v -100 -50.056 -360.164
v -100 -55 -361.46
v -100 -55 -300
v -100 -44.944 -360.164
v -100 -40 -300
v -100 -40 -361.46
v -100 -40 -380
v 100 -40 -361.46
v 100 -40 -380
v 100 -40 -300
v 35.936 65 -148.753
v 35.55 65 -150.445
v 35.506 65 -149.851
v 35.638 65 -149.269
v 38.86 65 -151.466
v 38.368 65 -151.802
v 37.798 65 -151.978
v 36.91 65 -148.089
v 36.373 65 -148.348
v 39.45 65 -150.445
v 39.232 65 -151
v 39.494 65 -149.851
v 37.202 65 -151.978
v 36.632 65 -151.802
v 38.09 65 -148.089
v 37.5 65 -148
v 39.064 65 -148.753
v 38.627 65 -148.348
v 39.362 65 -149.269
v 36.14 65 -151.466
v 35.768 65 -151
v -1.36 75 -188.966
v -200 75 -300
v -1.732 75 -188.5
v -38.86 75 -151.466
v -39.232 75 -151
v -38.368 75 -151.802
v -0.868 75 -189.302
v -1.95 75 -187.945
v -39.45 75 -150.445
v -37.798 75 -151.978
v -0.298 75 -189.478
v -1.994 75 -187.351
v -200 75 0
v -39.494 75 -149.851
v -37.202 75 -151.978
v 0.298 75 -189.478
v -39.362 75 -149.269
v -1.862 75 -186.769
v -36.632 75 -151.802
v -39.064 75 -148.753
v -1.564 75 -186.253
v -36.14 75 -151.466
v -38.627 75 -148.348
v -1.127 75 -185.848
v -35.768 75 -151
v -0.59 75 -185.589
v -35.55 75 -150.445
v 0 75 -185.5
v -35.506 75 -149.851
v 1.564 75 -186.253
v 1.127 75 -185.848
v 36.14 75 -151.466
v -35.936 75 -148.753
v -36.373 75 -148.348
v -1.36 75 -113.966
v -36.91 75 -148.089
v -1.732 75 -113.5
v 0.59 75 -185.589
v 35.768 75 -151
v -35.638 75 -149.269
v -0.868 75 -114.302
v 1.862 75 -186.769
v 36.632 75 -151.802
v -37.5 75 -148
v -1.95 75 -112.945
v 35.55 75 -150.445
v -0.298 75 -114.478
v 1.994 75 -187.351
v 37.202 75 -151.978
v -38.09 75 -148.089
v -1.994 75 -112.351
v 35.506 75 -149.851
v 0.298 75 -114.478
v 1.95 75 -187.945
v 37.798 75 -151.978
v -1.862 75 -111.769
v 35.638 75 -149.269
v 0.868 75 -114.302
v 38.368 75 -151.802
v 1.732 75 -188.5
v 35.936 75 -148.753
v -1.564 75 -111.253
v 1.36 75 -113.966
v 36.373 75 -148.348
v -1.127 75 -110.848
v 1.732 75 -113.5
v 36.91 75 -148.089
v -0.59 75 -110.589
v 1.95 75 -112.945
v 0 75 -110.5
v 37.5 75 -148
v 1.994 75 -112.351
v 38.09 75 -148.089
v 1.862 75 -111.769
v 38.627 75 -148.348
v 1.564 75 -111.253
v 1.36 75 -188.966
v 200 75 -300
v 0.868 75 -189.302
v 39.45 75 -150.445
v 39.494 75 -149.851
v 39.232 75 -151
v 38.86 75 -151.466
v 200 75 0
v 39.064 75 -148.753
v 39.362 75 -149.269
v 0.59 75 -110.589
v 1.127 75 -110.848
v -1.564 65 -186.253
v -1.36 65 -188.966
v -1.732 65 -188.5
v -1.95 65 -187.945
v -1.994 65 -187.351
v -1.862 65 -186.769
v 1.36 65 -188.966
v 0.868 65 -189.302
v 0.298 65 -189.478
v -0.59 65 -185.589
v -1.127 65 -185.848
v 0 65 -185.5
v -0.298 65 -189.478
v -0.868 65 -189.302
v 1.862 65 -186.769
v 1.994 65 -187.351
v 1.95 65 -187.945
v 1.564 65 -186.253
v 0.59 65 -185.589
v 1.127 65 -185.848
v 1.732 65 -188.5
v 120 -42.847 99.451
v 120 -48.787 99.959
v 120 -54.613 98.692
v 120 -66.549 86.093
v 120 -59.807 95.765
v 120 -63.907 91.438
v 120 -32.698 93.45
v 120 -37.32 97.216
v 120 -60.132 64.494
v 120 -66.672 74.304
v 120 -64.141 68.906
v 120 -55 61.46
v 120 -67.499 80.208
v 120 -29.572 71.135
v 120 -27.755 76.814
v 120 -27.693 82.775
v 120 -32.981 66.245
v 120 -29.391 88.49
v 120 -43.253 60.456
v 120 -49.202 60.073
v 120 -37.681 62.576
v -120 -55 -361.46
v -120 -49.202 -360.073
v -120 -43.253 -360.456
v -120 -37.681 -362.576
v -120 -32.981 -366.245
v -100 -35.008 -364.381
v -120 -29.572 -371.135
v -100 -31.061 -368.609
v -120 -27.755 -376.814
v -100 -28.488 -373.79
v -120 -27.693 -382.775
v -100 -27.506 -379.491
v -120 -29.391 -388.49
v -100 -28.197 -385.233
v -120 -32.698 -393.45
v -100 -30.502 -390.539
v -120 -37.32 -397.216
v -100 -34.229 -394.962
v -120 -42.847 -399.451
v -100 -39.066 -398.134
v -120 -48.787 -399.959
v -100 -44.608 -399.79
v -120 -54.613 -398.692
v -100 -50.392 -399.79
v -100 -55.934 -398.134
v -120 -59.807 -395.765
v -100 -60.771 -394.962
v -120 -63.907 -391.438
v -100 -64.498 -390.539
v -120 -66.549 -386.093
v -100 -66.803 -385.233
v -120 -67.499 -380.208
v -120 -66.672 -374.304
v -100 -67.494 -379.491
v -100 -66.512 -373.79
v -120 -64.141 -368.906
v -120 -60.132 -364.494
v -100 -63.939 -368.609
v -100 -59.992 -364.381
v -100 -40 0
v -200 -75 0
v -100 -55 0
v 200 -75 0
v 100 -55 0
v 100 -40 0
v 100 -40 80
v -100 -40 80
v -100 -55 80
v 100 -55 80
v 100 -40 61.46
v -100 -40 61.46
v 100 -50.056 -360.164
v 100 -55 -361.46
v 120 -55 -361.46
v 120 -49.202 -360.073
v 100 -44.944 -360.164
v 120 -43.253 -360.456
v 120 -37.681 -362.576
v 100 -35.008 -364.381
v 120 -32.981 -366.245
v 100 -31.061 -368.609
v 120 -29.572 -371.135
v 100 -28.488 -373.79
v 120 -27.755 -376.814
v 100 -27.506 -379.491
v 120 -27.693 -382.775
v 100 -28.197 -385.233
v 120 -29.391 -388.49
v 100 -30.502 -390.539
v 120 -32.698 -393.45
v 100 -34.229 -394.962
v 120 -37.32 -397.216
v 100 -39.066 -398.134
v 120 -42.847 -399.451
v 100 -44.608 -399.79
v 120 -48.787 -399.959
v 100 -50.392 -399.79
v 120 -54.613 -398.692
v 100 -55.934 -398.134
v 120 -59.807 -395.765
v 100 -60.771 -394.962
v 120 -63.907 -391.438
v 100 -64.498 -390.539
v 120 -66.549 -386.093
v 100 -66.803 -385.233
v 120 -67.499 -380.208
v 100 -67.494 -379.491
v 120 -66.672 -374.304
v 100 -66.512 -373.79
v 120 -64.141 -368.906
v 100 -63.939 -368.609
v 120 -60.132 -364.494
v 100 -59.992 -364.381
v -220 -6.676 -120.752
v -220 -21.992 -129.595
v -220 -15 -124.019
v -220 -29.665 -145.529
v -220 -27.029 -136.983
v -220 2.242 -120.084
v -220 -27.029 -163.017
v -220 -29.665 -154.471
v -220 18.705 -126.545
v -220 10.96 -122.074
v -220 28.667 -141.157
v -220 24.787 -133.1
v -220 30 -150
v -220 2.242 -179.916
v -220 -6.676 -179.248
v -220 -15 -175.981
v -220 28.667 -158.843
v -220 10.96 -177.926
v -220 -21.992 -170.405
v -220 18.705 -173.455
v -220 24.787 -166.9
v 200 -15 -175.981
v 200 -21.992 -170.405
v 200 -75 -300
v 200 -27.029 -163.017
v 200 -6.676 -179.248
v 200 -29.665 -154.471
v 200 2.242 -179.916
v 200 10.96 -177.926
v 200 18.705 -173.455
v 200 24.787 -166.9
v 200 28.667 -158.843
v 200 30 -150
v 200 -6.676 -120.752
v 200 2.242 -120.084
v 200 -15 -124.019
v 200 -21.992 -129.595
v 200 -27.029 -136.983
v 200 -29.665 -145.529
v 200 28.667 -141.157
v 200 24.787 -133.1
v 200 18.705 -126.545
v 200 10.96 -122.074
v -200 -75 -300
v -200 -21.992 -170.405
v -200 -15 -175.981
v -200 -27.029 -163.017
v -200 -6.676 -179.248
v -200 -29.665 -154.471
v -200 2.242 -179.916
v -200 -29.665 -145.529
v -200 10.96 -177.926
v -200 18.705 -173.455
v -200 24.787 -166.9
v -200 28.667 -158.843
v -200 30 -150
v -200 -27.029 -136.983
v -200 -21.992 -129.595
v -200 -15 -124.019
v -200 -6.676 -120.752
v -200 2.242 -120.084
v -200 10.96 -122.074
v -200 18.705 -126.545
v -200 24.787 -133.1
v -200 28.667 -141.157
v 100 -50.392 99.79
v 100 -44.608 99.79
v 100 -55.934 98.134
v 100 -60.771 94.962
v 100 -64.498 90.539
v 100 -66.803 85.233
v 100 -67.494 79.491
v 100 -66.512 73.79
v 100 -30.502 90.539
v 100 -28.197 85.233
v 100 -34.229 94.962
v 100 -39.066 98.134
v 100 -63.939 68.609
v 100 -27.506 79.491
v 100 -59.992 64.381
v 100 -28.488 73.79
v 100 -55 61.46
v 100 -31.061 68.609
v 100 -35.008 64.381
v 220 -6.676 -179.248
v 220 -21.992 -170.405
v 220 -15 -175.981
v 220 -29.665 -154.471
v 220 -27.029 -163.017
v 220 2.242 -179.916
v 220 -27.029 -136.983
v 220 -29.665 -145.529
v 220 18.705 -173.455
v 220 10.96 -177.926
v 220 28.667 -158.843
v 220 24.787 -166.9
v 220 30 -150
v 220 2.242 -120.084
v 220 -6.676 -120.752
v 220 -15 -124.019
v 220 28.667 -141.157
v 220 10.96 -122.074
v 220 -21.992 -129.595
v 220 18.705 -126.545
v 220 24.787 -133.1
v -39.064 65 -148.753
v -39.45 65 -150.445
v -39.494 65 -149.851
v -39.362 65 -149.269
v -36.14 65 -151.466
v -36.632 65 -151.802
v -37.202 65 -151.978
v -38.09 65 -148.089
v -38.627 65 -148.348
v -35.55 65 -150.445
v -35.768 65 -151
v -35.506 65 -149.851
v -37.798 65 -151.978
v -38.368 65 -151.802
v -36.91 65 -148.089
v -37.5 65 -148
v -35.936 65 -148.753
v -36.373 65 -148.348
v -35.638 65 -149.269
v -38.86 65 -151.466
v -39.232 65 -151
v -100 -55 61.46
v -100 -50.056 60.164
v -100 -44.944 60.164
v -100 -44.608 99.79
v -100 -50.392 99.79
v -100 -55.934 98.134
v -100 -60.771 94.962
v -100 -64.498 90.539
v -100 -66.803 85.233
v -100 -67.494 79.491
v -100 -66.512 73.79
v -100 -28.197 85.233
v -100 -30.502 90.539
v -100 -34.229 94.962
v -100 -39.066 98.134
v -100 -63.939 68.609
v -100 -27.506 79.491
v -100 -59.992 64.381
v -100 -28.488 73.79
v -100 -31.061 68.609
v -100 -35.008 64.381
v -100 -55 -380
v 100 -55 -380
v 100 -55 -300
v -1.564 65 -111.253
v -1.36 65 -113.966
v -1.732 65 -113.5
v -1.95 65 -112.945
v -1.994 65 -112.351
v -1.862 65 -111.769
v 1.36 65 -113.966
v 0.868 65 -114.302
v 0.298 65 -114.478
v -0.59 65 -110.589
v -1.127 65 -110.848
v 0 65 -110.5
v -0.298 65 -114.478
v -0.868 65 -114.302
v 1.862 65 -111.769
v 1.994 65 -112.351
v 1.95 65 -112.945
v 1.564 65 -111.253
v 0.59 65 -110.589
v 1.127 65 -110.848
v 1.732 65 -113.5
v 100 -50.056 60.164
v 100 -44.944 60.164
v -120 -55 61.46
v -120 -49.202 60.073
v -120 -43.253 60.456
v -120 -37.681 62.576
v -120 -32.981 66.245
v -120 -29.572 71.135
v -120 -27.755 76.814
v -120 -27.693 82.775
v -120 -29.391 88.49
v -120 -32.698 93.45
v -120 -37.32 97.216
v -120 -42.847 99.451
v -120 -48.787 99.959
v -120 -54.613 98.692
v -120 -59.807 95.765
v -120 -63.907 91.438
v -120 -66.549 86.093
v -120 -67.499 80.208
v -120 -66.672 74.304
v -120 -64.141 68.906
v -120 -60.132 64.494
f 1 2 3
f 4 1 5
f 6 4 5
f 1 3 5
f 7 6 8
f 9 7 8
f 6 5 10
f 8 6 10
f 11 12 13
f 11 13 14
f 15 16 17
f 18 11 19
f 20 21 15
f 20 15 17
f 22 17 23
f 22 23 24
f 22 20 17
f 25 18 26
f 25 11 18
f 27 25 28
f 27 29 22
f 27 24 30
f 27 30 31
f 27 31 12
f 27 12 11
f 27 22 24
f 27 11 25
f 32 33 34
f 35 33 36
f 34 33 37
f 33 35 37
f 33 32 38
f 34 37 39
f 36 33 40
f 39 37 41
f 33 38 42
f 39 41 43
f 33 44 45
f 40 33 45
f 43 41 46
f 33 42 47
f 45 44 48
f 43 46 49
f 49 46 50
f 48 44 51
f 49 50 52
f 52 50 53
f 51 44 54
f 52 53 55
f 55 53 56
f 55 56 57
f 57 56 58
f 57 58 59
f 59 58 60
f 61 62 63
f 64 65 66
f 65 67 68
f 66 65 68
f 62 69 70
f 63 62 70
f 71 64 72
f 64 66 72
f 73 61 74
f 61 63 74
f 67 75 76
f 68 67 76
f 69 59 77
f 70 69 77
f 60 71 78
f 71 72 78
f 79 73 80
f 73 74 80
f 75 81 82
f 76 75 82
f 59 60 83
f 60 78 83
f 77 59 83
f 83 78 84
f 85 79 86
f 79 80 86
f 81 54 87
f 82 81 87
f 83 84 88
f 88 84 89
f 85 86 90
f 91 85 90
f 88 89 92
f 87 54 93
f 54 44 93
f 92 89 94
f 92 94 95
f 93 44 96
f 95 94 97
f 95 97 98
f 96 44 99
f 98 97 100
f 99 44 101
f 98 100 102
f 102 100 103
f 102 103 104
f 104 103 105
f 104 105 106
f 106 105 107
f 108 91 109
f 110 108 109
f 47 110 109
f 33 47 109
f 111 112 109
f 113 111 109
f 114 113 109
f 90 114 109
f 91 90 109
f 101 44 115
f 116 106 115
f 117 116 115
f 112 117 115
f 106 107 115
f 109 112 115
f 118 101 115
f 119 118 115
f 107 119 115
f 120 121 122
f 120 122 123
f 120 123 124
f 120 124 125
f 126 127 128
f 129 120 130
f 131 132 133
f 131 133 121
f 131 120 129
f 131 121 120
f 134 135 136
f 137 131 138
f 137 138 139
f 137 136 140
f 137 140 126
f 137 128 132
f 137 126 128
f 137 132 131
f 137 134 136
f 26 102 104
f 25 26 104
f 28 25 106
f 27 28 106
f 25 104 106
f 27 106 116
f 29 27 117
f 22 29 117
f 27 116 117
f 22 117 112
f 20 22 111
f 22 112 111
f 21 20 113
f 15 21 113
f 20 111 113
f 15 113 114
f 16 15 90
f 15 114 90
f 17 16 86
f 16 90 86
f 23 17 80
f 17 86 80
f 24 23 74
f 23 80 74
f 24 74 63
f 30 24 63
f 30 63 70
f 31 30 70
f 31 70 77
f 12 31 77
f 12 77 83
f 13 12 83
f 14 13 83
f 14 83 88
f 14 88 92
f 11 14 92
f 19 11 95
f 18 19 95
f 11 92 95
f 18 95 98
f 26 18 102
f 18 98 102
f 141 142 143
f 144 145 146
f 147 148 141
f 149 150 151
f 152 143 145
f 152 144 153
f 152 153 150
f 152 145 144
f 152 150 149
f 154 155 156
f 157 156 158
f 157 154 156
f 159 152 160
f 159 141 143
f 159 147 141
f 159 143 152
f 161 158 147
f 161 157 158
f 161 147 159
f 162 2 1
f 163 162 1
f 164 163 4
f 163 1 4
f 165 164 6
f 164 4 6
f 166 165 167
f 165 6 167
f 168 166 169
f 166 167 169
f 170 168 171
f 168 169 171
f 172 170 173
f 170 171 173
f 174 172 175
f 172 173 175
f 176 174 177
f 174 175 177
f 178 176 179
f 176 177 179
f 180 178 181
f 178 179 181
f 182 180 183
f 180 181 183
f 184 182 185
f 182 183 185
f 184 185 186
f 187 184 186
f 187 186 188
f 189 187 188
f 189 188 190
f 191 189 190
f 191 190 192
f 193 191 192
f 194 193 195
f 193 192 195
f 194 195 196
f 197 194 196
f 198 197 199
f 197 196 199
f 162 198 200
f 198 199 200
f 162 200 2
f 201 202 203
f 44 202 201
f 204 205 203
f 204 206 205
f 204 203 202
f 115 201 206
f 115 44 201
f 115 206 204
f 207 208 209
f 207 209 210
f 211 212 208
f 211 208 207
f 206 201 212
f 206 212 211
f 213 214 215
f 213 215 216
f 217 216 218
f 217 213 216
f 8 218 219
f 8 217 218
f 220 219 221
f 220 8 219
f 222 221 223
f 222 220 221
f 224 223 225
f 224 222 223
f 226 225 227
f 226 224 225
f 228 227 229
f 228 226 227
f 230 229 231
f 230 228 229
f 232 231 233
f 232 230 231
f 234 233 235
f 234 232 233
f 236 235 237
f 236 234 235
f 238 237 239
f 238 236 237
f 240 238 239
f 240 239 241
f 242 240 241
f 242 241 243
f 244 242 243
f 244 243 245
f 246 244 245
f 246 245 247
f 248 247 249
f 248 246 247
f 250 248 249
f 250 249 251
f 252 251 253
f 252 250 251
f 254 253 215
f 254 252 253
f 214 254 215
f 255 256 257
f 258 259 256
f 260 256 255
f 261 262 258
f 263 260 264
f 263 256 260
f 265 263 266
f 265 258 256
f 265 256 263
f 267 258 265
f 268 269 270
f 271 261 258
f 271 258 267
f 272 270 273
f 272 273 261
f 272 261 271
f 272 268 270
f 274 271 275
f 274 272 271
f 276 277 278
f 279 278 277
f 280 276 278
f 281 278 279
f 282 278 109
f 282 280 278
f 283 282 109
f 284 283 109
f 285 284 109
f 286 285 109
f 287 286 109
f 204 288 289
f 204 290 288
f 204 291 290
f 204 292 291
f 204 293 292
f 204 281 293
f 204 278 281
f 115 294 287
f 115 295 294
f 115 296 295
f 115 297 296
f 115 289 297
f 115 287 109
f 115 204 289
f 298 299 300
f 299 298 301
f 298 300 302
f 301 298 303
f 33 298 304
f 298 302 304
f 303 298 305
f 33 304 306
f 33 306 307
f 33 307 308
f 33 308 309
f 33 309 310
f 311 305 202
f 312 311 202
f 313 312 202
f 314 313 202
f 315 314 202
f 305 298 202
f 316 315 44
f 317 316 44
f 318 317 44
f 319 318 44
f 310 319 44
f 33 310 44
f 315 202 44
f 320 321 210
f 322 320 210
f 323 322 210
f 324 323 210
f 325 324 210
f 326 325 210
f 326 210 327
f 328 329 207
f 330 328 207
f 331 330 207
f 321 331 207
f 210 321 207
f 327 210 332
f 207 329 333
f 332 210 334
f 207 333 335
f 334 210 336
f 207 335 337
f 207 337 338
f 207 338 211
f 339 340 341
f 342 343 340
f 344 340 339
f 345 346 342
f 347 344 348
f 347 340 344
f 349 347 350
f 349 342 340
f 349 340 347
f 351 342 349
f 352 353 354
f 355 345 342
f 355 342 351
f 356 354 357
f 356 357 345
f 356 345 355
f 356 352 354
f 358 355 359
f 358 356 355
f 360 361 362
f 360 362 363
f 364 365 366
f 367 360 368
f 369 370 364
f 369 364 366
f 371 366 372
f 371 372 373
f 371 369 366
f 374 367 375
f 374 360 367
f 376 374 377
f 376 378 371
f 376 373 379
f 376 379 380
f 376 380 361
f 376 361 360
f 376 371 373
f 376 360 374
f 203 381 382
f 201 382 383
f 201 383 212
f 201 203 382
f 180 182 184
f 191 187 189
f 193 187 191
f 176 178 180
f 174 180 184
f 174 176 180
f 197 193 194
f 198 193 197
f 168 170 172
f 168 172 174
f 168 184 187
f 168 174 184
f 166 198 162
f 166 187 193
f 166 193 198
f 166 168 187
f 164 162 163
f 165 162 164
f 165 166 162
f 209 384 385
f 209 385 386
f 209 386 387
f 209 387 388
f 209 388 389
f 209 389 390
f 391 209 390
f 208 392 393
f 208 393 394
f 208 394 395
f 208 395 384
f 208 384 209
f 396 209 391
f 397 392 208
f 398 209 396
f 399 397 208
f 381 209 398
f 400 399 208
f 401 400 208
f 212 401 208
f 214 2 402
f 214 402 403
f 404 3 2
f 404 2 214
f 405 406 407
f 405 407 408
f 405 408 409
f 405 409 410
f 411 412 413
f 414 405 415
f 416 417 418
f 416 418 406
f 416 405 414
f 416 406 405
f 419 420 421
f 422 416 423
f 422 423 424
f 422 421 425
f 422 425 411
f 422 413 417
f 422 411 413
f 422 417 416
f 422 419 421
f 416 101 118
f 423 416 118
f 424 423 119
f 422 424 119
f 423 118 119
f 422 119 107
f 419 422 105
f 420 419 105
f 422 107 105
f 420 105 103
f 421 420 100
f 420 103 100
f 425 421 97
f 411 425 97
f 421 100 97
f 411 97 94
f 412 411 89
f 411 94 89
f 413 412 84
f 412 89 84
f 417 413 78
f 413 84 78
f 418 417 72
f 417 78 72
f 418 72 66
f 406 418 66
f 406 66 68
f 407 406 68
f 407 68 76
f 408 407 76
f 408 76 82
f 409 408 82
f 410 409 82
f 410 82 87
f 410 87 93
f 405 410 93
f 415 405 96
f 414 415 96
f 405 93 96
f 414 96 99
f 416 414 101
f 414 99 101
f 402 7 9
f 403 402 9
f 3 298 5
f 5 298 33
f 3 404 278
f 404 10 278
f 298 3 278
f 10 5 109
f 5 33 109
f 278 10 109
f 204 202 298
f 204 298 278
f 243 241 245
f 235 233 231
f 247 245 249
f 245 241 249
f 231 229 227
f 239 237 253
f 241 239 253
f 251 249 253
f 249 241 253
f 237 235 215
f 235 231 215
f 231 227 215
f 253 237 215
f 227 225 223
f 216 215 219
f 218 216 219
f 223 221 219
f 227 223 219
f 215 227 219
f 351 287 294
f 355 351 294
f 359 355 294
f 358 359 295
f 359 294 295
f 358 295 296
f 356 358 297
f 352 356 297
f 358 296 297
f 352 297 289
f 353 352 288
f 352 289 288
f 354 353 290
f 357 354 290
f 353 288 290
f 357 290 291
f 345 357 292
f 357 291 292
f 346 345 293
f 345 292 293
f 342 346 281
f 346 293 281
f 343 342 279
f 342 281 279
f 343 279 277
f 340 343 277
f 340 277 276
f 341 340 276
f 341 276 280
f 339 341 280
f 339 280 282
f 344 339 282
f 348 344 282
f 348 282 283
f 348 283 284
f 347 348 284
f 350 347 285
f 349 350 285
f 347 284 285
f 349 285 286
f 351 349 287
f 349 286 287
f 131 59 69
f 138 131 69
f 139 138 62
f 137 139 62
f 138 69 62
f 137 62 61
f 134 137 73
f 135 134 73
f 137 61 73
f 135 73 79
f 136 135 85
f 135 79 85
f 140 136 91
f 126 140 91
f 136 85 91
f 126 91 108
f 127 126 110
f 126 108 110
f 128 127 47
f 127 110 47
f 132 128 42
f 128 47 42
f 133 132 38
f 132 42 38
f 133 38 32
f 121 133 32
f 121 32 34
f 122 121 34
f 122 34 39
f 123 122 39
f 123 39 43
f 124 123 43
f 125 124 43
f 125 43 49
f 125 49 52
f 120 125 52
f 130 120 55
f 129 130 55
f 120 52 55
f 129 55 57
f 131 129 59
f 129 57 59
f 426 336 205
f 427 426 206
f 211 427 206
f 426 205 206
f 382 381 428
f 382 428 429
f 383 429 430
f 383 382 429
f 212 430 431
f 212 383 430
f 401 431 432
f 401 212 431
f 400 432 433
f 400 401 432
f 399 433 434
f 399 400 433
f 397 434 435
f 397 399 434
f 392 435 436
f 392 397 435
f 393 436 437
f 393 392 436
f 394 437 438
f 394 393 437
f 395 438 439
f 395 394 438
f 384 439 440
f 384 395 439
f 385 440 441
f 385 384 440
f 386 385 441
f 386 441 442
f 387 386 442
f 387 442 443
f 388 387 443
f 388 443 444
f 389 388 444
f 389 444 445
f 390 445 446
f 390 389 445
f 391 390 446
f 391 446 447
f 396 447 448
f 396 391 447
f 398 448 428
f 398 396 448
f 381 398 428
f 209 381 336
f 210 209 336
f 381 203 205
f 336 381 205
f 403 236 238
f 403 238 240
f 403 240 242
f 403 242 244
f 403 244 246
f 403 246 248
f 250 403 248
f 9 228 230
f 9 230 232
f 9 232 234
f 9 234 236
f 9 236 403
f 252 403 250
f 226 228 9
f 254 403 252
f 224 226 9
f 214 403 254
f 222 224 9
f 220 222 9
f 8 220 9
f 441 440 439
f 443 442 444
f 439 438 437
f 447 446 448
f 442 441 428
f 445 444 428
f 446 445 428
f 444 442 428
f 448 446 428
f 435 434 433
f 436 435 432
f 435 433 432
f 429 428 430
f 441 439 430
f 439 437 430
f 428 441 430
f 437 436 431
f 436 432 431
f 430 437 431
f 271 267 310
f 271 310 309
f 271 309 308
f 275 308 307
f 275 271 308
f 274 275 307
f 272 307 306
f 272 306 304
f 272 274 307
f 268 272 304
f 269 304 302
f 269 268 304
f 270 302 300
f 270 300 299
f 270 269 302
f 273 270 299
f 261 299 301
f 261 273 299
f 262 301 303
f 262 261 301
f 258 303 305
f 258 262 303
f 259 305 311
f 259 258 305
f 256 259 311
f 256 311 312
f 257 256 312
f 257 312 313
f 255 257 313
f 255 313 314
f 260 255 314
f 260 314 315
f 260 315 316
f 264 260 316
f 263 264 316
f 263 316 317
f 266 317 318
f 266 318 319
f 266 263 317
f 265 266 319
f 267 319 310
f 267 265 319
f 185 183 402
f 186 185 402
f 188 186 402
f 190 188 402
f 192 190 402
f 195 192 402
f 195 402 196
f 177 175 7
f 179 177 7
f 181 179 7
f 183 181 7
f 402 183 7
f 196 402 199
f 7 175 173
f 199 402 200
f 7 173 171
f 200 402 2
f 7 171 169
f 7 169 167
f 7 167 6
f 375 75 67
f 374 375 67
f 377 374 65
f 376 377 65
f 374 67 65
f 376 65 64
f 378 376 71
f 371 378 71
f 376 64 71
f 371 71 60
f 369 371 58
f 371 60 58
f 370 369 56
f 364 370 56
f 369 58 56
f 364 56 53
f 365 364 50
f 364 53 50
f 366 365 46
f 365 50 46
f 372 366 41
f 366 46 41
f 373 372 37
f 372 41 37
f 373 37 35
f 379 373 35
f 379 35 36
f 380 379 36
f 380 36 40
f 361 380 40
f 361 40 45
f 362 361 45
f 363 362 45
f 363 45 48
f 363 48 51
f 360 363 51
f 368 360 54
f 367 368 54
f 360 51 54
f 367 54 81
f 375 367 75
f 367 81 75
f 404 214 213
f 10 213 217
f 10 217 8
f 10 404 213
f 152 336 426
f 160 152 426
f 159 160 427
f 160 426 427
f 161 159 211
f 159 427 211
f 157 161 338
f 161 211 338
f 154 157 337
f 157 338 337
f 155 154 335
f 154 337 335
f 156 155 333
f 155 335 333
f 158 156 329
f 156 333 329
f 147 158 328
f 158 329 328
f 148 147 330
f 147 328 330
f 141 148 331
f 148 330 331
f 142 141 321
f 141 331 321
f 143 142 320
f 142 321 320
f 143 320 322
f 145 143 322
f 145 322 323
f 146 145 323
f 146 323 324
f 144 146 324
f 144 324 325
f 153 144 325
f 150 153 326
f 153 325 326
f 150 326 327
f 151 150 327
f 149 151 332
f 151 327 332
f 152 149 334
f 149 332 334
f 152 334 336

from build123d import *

# Parameters (mm, degrees)
SKETCH_1_W               = 400
SKETCH_1_H               = 150
EXTRUDE_1_DEPTH          = 300
SKETCH_2_R               = 30
EXTRUDE_2_DEPTH          = 20
SKETCH_8_W               = 200
SKETCH_8_H               = 15
EXTRUDE_6_DEPTH          = 80
SKETCH_9_R               = 20
EXTRUDE_7_DEPTH          = 20
MIRROR_4_COPY_1_SKETCH_R = 20
MIRROR_4_COPY_1_DEPTH    = 20
SKETCH_10_R              = 2
CUT_EXTRUDE_1_DEPTH      = 10
EXTRUDE_START            = 20
SKETCH_6_R               = 30
EXTRUDE_8_DEPTH          = 20


with BuildPart() as part:
    # 草图1 → 凸台-拉伸1 (new body)
    with BuildSketch(Plane.XY):
        Rectangle(SKETCH_1_W, SKETCH_1_H)
    extrude(amount=-EXTRUDE_1_DEPTH)

    # 草图2 → 凸台-拉伸2 (add)
    with BuildSketch(Plane(origin=(200, 0, 0), x_dir=(0, 0, -1), z_dir=(1, 0, 0))):
        with Locations(Location((150, 0, 0), (0, 0, 90))):
            Circle(SKETCH_2_R)
    extrude(amount=EXTRUDE_2_DEPTH)

    # 草图8 → 凸台-拉伸6 (add)
    with BuildSketch(Plane.XY):
        with Locations((0, -47.5)):
            Rectangle(SKETCH_8_W, SKETCH_8_H)
    extrude_6 = extrude(amount=EXTRUDE_6_DEPTH)

    # 镜向2: 凸台-拉伸6 across plane
    add(extrude_6.mirror(Plane.XY.offset(-150)))

    # 草图9 → 凸台-拉伸7 (add)
    with BuildSketch(Plane(origin=(100, 0, 0), x_dir=(0, 0, -1), z_dir=(1, 0, 0))):
        with Locations(Location((-80, -47.5, 0), (0, 0, 337.975687163))):
            Circle(SKETCH_9_R)
    extrude_7 = extrude(amount=EXTRUDE_7_DEPTH)

    # 镜向3: 凸台-拉伸7 across plane
    add(extrude_7.mirror(Plane.XY.offset(-150)))

    # 镜向4: 凸台-拉伸7 across plane
    add(extrude_7.mirror(Plane(origin=(0, 0, 0), x_dir=(0, 0, 1), z_dir=(1, 0, 0))))

    # 镜向4 copy 1 sketch → 镜向4 copy 1 (add)
    with BuildSketch(Plane(origin=(-100, 0, -300), x_dir=(0, 0, 1), z_dir=(-1, 0, 0))):
        with Locations(Location((-80, -47.5, 0), (0, 0, 337.975687163))):
            Circle(MIRROR_4_COPY_1_SKETCH_R)
    extrude(amount=MIRROR_4_COPY_1_DEPTH)

    # 草图10 → 切除-拉伸1 (cut)
    with BuildSketch(Plane(origin=(0, 75, 0), x_dir=(1, 0, 0), z_dir=(0, 1, 0))):
        with Locations(Location((0, 187.5, 0), (0, 0, 270))):
            Circle(SKETCH_10_R)
        with Locations(Location((37.5, 150, 0), (0, 0, 270))):
            Circle(SKETCH_10_R)
        with Locations(Location((0, 112.5, 0), (0, 0, 270))):
            Circle(SKETCH_10_R)
        with Locations(Location((-37.5, 150, 0), (0, 0, 270))):
            Circle(SKETCH_10_R)
    extrude(amount=-CUT_EXTRUDE_1_DEPTH, mode=Mode.SUBTRACT)

    # 草图6 → 凸台-拉伸8 (add)
    with BuildSketch(Plane.ZY.offset(200).offset(EXTRUDE_START)):
        with Locations(Location((-150, 0, 0), (0, 0, 90))):
            Circle(SKETCH_6_R)
    extrude(amount=-EXTRUDE_8_DEPTH)


solid = part.part
